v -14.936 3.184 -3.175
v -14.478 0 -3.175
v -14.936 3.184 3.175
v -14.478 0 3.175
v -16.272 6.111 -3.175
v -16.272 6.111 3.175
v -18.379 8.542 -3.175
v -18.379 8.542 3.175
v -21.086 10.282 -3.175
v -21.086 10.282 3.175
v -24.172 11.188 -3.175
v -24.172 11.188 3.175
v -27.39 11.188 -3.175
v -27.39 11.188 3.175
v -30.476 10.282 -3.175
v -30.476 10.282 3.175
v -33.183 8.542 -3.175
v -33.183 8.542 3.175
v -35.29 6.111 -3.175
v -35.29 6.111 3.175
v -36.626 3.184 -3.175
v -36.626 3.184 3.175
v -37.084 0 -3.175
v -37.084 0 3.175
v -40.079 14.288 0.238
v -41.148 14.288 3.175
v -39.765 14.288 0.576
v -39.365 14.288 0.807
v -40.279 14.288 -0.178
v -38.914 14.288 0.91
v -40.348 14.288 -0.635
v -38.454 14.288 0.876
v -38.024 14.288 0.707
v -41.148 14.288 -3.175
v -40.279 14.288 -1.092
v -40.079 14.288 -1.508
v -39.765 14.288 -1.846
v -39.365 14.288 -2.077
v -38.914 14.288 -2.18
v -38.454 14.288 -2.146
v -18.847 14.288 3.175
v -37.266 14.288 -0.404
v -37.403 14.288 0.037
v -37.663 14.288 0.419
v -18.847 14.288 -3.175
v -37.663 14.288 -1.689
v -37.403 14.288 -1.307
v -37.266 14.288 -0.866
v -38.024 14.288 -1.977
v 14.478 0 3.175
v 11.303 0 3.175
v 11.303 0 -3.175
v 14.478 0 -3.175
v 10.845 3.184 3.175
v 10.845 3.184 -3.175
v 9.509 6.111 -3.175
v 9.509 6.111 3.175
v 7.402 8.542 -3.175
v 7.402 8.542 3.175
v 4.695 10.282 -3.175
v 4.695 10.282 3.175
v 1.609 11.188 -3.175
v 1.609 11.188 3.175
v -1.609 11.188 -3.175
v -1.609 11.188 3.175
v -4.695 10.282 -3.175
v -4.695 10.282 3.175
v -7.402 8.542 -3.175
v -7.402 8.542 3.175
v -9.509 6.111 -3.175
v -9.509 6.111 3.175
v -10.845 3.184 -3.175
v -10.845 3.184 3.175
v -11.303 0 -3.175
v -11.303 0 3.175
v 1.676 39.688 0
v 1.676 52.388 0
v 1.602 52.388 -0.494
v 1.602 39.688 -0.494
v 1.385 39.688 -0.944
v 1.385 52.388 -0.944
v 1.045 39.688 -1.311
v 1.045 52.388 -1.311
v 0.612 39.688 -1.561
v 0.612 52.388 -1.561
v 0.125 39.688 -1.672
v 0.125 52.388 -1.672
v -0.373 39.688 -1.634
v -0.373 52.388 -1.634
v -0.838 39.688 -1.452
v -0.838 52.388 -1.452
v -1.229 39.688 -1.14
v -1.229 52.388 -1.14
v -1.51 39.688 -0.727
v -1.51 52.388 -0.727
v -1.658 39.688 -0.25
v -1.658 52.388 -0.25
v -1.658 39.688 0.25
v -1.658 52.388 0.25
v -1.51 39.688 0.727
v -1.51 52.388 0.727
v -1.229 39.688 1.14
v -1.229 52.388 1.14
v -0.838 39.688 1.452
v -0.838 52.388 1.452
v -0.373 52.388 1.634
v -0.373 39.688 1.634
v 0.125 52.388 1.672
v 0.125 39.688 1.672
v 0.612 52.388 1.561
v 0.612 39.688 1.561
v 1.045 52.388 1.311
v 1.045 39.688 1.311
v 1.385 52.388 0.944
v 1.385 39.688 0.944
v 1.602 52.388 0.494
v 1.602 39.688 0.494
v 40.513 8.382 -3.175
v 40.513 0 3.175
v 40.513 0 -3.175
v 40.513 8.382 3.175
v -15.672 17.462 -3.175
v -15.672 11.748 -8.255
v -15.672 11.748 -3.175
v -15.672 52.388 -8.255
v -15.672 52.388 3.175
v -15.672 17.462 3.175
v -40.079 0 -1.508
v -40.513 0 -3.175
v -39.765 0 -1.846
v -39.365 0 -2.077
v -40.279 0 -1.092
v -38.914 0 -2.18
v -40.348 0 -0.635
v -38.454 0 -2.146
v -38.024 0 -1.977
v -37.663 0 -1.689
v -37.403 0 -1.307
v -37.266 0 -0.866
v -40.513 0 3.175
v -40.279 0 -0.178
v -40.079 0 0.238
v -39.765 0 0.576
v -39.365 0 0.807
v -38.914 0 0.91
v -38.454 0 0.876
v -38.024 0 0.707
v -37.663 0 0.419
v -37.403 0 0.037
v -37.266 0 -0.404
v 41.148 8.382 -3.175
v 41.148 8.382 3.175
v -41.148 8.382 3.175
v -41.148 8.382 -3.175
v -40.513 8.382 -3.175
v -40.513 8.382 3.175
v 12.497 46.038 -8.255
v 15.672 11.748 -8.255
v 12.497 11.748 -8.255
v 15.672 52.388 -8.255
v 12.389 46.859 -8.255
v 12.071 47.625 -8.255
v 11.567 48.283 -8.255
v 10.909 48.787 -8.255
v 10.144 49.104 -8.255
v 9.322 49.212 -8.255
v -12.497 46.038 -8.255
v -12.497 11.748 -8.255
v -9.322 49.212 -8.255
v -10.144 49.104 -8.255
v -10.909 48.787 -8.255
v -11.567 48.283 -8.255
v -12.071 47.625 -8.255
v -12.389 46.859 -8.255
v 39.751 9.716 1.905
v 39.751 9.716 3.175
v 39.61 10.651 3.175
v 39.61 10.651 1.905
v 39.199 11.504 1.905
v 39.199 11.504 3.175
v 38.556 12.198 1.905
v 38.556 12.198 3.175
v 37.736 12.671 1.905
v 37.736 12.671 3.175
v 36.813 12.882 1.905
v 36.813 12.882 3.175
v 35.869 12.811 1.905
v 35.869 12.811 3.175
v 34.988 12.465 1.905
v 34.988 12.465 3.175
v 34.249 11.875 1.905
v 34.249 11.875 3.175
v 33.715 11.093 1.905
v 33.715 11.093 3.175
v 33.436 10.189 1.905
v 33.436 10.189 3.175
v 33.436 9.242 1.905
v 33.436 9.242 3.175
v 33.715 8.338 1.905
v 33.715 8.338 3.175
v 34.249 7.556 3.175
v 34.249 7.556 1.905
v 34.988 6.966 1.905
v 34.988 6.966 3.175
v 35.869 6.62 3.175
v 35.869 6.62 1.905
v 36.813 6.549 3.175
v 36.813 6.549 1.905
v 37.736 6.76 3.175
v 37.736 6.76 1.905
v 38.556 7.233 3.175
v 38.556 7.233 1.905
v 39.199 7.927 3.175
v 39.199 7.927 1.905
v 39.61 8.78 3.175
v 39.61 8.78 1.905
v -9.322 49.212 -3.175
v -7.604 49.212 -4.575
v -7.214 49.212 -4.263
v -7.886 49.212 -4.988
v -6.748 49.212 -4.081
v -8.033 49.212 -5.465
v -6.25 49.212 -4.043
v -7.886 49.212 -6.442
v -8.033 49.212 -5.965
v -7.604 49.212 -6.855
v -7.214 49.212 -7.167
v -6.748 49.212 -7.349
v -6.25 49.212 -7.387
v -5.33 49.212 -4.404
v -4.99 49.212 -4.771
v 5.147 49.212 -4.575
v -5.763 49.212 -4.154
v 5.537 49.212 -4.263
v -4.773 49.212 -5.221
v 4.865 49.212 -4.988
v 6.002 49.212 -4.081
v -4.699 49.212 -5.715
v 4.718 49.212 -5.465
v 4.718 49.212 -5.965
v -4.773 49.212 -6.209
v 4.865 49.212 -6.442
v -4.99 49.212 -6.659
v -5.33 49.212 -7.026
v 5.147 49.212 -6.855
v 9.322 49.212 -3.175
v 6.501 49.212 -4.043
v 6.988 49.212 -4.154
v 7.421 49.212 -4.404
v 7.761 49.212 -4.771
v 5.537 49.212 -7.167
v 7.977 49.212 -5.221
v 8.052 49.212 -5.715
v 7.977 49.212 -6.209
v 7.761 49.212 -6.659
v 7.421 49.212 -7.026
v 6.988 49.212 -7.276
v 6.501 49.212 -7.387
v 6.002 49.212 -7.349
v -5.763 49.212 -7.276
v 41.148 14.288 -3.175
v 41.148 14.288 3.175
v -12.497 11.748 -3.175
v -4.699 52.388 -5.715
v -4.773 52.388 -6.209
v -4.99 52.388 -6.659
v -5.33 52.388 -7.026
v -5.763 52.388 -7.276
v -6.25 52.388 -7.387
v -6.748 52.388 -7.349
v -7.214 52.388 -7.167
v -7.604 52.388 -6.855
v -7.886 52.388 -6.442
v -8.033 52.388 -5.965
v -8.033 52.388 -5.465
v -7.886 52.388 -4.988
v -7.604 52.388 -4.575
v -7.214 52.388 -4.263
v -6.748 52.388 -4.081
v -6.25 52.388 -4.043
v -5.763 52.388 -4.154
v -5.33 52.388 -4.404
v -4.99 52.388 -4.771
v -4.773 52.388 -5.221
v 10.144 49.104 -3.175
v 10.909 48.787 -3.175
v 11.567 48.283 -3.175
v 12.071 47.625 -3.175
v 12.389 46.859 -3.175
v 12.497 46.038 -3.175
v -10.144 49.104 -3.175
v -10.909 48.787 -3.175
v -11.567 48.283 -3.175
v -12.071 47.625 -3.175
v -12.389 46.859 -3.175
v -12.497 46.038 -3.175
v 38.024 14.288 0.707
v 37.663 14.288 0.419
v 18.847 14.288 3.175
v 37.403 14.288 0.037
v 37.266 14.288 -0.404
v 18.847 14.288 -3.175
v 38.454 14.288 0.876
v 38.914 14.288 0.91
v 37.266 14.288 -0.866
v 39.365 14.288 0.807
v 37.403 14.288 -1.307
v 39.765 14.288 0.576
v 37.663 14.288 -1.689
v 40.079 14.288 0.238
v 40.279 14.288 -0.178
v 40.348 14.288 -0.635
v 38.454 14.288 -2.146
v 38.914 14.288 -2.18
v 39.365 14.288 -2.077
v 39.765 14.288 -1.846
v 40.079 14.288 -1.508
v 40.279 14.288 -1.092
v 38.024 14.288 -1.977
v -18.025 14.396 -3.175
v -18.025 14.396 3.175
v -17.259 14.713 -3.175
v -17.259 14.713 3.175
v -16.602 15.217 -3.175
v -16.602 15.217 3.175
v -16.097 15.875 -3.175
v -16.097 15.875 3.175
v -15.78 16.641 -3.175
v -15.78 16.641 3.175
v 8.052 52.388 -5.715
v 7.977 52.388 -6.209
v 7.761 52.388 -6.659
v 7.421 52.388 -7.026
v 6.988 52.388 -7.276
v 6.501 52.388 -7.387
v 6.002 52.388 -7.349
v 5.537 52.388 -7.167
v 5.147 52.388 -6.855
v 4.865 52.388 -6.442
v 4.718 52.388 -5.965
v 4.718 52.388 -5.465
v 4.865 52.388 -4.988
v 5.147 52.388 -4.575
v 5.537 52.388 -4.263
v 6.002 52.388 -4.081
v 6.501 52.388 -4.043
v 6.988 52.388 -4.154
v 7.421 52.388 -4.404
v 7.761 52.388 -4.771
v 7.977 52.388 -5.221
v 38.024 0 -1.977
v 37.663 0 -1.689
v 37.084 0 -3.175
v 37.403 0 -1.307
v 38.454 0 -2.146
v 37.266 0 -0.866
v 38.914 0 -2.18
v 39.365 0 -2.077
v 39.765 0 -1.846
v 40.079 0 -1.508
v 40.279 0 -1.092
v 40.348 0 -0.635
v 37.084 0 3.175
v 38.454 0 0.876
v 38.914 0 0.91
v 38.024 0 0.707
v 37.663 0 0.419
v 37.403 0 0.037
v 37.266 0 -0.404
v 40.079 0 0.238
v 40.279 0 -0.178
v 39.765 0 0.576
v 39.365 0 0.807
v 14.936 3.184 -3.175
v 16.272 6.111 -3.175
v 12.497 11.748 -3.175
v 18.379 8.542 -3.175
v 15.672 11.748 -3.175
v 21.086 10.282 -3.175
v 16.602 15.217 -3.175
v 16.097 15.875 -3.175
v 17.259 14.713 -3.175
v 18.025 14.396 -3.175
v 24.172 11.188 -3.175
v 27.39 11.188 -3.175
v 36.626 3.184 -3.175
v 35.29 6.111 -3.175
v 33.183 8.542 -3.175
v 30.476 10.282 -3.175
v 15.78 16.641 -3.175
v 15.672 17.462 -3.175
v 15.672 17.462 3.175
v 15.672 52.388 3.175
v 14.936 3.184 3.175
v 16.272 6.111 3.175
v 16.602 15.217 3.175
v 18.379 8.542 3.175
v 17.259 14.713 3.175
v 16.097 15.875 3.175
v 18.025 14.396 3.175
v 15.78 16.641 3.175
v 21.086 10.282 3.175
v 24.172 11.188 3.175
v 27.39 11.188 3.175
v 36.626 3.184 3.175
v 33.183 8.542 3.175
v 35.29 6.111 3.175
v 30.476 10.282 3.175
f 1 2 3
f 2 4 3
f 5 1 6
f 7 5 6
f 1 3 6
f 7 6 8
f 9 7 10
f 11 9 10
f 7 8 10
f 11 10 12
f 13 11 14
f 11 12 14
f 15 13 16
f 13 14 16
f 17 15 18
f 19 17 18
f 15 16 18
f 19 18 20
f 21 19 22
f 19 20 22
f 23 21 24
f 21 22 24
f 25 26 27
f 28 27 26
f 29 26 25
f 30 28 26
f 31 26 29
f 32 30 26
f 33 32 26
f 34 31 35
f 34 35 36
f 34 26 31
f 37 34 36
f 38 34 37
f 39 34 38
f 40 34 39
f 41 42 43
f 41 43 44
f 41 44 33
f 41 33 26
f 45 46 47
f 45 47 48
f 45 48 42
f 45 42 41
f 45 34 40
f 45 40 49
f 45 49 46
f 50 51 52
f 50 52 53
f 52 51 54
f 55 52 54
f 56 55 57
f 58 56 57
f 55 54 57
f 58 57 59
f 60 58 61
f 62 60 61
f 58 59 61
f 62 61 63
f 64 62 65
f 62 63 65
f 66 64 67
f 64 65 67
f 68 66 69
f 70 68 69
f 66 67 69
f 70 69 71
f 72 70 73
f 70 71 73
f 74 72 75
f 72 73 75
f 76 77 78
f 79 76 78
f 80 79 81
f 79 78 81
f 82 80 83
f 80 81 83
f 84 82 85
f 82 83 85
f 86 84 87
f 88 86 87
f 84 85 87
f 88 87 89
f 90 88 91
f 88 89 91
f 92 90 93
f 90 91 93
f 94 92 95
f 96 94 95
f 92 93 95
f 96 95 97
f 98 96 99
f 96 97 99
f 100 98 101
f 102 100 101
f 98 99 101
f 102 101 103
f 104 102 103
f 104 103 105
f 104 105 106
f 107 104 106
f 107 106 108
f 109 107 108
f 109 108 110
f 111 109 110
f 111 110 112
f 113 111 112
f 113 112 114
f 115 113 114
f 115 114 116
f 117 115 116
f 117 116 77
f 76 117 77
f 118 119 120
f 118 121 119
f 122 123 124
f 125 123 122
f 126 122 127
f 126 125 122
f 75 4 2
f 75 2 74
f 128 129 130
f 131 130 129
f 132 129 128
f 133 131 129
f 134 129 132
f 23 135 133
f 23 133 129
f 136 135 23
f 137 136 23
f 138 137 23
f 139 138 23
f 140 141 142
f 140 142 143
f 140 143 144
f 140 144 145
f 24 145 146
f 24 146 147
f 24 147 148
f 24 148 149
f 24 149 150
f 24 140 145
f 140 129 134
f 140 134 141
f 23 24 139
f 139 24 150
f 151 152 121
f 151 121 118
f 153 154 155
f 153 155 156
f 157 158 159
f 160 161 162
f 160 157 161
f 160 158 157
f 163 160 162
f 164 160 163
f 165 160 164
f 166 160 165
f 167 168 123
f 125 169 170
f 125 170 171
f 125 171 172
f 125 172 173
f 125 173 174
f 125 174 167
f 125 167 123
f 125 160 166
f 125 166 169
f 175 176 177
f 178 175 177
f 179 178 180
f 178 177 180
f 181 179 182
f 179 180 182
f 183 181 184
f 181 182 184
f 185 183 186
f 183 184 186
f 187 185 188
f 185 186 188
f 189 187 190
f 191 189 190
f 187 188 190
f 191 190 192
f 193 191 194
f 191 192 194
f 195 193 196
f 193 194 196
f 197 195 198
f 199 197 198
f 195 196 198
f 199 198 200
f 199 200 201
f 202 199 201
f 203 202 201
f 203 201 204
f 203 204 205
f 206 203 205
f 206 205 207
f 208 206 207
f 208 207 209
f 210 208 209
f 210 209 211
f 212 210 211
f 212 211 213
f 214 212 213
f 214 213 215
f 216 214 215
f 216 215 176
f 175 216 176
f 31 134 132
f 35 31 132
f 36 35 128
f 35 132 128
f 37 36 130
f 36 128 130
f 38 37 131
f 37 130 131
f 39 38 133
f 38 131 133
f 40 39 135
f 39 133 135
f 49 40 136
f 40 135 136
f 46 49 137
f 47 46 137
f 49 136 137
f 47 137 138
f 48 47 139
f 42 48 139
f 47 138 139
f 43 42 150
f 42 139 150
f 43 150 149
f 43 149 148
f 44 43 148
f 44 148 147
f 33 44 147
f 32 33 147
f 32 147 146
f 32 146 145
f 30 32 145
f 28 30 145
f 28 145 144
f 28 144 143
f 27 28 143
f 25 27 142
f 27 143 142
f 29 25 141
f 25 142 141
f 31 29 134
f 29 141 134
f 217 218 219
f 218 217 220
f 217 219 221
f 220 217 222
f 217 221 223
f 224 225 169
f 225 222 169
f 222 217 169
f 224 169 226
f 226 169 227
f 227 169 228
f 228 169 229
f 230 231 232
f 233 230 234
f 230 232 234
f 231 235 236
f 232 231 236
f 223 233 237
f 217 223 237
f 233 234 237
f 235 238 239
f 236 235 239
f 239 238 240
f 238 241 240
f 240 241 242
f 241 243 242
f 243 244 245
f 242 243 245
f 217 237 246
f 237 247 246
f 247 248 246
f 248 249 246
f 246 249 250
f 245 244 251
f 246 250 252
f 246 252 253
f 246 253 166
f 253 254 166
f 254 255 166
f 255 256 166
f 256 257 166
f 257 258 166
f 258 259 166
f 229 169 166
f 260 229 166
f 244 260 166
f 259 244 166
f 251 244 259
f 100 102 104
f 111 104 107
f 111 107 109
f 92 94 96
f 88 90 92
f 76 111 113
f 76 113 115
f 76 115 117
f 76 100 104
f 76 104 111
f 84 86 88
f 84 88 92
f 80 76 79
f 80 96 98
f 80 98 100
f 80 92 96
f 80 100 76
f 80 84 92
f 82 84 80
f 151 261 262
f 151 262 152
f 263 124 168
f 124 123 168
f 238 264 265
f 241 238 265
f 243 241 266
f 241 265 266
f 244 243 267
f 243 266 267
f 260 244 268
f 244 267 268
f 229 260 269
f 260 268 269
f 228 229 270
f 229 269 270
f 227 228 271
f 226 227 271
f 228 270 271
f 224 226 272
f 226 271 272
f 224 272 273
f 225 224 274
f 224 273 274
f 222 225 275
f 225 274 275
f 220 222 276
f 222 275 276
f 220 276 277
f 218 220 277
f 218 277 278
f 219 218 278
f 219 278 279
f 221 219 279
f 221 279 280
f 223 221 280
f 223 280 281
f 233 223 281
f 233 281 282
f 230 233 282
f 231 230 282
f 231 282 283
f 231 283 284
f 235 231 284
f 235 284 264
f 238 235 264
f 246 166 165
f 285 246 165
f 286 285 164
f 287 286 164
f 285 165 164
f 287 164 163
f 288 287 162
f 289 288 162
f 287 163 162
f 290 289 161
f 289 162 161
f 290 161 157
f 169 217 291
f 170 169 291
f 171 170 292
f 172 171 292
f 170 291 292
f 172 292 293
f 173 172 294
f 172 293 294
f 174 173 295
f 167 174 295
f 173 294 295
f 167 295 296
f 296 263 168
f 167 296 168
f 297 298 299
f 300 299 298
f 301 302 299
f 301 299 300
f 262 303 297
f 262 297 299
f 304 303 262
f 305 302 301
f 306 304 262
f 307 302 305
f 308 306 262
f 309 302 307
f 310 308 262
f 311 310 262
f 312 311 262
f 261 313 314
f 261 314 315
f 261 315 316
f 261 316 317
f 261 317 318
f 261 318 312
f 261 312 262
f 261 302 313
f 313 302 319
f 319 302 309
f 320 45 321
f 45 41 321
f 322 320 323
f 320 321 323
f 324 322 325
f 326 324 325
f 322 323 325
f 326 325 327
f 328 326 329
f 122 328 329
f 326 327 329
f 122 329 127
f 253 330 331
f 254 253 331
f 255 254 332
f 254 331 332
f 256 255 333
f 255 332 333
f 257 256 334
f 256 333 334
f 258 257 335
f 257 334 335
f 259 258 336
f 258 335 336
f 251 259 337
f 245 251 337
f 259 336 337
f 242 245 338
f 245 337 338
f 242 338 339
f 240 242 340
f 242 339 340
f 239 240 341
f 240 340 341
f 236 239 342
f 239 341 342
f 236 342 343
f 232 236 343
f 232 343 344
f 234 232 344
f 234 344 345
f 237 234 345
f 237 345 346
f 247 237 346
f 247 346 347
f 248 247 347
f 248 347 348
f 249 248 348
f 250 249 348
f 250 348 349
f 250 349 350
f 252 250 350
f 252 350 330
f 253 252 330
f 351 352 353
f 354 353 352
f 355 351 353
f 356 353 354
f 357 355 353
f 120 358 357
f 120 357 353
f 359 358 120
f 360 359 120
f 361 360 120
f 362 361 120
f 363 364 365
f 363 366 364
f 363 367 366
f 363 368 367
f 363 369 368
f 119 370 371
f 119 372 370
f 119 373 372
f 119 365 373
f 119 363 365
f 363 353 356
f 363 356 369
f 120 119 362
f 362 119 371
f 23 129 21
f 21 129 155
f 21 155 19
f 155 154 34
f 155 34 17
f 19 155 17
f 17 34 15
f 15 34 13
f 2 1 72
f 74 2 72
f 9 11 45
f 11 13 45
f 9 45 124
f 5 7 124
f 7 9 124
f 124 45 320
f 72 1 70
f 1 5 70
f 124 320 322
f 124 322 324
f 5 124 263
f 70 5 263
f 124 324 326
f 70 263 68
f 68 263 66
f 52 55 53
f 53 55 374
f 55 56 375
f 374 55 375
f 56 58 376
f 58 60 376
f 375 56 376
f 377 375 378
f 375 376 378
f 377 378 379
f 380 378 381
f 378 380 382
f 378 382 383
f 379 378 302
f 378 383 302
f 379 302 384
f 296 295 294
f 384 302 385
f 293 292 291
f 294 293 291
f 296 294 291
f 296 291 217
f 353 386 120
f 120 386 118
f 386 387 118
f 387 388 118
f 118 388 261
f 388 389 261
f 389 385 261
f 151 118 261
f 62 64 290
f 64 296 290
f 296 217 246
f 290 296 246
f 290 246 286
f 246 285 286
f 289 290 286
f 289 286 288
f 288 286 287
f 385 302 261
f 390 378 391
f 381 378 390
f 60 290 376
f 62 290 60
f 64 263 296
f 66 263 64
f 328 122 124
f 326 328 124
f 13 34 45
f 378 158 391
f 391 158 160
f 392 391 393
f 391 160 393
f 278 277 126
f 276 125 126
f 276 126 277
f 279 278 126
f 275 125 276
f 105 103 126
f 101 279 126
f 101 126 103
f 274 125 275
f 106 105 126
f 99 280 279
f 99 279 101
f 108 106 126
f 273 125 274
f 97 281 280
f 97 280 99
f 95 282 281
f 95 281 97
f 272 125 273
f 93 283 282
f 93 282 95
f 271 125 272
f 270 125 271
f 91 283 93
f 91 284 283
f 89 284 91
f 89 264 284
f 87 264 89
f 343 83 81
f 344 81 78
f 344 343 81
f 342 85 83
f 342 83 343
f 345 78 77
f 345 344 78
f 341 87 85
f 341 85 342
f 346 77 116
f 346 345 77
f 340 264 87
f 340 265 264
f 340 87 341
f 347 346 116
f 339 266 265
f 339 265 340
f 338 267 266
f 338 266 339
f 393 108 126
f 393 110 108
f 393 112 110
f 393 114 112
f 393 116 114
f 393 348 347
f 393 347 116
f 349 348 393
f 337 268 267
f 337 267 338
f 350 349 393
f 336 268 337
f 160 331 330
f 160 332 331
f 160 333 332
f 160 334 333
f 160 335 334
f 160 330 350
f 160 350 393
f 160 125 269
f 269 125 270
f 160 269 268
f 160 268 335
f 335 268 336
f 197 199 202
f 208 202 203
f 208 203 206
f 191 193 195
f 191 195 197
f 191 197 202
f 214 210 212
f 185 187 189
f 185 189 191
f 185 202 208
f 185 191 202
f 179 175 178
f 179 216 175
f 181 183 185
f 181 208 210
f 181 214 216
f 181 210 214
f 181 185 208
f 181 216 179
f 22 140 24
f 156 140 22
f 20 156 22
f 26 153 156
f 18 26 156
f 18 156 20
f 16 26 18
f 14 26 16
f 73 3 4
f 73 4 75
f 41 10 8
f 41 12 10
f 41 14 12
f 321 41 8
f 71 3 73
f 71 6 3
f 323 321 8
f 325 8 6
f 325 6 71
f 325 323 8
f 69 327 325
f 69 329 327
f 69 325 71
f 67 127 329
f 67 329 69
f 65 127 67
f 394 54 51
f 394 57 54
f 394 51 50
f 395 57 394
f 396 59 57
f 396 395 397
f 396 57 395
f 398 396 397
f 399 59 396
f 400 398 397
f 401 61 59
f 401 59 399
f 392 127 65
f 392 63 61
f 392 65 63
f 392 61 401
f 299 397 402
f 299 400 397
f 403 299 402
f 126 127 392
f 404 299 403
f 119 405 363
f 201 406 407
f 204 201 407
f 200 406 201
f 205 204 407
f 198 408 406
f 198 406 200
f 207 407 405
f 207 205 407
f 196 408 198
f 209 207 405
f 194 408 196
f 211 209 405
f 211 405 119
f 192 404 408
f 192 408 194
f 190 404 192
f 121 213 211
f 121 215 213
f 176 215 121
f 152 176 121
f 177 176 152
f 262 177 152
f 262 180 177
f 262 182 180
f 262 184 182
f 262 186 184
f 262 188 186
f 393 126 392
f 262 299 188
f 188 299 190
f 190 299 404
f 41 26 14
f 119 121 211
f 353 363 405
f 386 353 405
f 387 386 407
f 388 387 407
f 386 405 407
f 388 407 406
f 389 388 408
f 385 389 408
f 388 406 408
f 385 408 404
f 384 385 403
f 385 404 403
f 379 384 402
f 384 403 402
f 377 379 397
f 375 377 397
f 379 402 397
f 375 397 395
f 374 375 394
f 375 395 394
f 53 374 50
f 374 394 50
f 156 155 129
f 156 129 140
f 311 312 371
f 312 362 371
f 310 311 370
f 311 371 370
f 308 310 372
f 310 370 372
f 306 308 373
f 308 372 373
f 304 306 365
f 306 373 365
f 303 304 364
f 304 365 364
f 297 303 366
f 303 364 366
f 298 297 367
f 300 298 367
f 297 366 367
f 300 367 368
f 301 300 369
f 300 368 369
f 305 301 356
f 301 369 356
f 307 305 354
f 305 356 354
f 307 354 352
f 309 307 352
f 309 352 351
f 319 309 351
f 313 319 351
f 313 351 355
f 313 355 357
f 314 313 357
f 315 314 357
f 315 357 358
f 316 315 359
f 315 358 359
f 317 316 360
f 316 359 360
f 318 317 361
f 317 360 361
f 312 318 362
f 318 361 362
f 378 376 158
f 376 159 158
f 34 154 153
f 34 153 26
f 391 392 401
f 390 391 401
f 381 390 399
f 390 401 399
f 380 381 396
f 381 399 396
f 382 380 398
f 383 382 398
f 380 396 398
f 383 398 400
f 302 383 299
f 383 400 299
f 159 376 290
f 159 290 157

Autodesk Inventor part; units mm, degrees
ref_plane "YZ Plane" through (0, 0, 0) normal (1, 0, 0) x (0, 1, 0)
ref_plane "XZ Plane" through (0, 0, 0) normal (0, 1, 0) x (-1, 0, 0)
ref_plane "XY Plane" through (0, 0, 0) normal (0, 0, 1) x (1, 0, 0)
sketch "Sketch1" plane through (0, 0, 0) normal (0, 0, 1) x (1, 0, 0)
  line L0 (-41.148, 14.2875) -> (41.148, 14.2875)
  line L1 (41.148, 14.2875) -> (41.148, -14.2875)
  line L2 (41.148, -14.2875) -> (-41.148, -14.2875)
  line L3 (-41.148, -14.2875) -> (-41.148, 14.2875)
  point P0 (0, 0)
  dimension "d0" = 82.296
  dimension "d1" = 41.148
  dimension "d2" = 14.2875
  dimension "d3" = 28.575
extrude "Extrusion1" add sketch "Sketch1" along normal mid plane 6.35
sketch "Sketch2" plane through (0, 0, 3.175) normal (0, 0, 1) x (1, 0, 0)
  circle A0 centre (-25.781, 0) radius 11.303
  circle A1 centre (0, 0) radius 11.303
  line L0 (41.148, -14.2875) -> (41.148, 14.2875) projected
  circle A2 centre (25.781, 0) radius 11.303
  line L1 (-41.148, 14.2875) -> (-41.148, -14.2875) projected
  line L2 (-41.148, 0) -> (41.148, 0) construction
  line L3 (41.148, 14.2875) -> (-41.148, 14.2875) projected
  point P0 (0, 0)
  dimension "d6" = 22.606
  dimension "d9" = 22.606
  dimension "d11" = 22.606
  dimension "d14" = 25.781
  dimension "d21" = 82.296
  dimension "d22" = 25.781
  dimension "d50" = 0
  dimension "d150" = 3.175
sketch "Sketch4" plane through (-41.148, -14.2875, -3.175) normal (-1, 0, 0) x (0, 0, 1)
  line L0 (0, 0) -> (0, 28.575) projected
  line L1 (6.35, 28.575) -> (6.35, 0) projected
  line L2 (0, 22.6695) -> (6.35, 22.6695)
  line L3 (6.35, 22.6695) -> (6.35, 5.9055)
  line L4 (6.35, 5.9055) -> (0, 5.9055)
  line L5 (0, 5.9055) -> (0, 22.6695)
  point P0 (3.175, 14.2875)
  dimension "d30" = 8.382
  dimension "d31" = 16.764
extrude "Extrusion3" cut sketch "Sketch4" against normal blind 0.635
mirror "Mirror1" about plane through (0, 0, 0) normal (1, 0, 0) of "Extrusion3"
sketch "Sketch5" plane through (0, 0, 3.175) normal (0, 0, 1) x (1, 0, 0)
  circle A0 centre (0, 9.7155) radius 3.175 construction
  line L0 (41.148, 14.2875) -> (-41.148, 14.2875) projected
  line L1 (-18.3944, 20.454) -> (40.513, 0) construction
  line L2 (40.513, 8.382) -> (40.513, -8.382) projected
  circle A1 centre (2.6968, 17.4822) radius 3.175 construction
  circle A2 centre (35.941, 1.5875) radius 3.175 construction
  circle A3 centre (-35.941, 26.5465) radius 3.175 construction
  line L3 (-40.513, 8.382) -> (-40.513, -8.382) projected
  circle A4 centre (36.576, 9.7155) radius 3.175
  circle A5 centre (-36.576, -9.7155) radius 3.175
  line L4 (41.148, 8.382) -> (41.148, 14.2875) projected
  line L5 (-41.148, -14.2875) -> (41.148, -14.2875) projected
  line L6 (-41.148, -14.2875) -> (-41.148, -8.382) projected
  point P0 (0, 0)
  dimension "d34" = 6.35
  dimension "d35" = 4.572
  dimension "d53" = 6.35
  dimension "d54" = 6.35
  dimension "d55" = 4.572
  dimension "d56" = 4.572
  dimension "d57" = 12.7
  dimension "d58" = 6.35
  dimension "d59" = 6.35
  dimension "d60" = 4.572
  dimension "d61" = 4.572
  dimension "d62" = 4.572
  dimension "d63" = 4.572
extrude "Extrusion4" cut sketch "Sketch5" against normal blind 1.27
sketch "Sketch7" plane through (-41.148, -14.2875, 3.175) normal (0, -1, 0) x (1, 0, 0)
  line L0 (27.178, -14.605) -> (55.118, -14.605)
  line L1 (55.118, -14.605) -> (55.118, 8.255)
  line L2 (55.118, 8.255) -> (27.178, 8.255)
  line L3 (27.178, 8.255) -> (27.178, -14.605)
  point P0 (41.148, -3.175)
  dimension "d39" = 27.94
  dimension "d40" = 22.86
  dimension "d41" = 11.43
  dimension "d42" = 13.97
extrude "Extrusion5" [suppressed]
sketch "Sketch8" plane through (0, 0, -3.175) normal (0, 0, -1) x (-1, 0, 0)
  line L0 (-41.148, 14.2875) -> (41.148, 14.2875) projected
  line L1 (15.6718, 14.2875) -> (-15.6718, 14.2875)
  line L2 (-15.6718, 14.2875) -> (-15.6718, 52.3875)
  line L3 (-15.6718, 52.3875) -> (15.6718, 52.3875)
  line L4 (15.6718, 52.3875) -> (15.6718, 14.2875)
  point P0 (0, 0)
  dimension "d45" = 31.3436
  dimension "d46" = 38.1
  dimension "d47" = 15.6718
extrude "Extrusion6" add sketch "Sketch8" against normal up to surface (6.35 mm away)
extrude "Extrusion7" cut sketch "Sketch2" against normal blind 25.4
sketch "Sketch9" plane through (-15.6718, 52.3875, -3.175) normal (0, 1, 0) x (1, 0, 0)
  line L0 (-25.4762, -6.35) -> (56.8198, -6.35) projected
  line L1 (3.1718, -6.35) -> (28.1718, -6.35)
  line L2 (28.1718, -6.35) -> (28.1718, -3.175)
  line L3 (28.1718, -3.175) -> (3.1718, -3.175)
  line L4 (3.1718, -3.175) -> (3.1718, -6.35)
  point P0 (15.6718, -3.175)
  dimension "d64" = 3.175
  dimension "d65" = 25
  dimension "d66" = 12.5
extrude "Extrusion8" [suppressed]
sketch "Sketch13" plane through (0, 0, 3.175) normal (0, 0, 1) x (1, 0, 0)
  line L0 (-41.148, -8.382) -> (-41.148, -14.2875) projected
  line L1 (-41.148, -14.2875) -> (41.148, -14.2875) projected
  line L2 (41.148, -14.2875) -> (41.148, -8.382) projected
  line L3 (41.148, -8.382) -> (40.513, -8.382) projected
  line L4 (-40.513, -8.382) -> (-41.148, -8.382) projected
  line L5 (-40.513, -8.382) -> (-40.513, 0)
  line L6 (-40.513, 8.382) -> (-40.513, -8.382) projected
  line L7 (-40.513, 0) -> (40.513, 0)
  line L8 (40.513, 8.382) -> (40.513, -8.382) projected
  line L9 (40.513, 0) -> (40.513, -8.382)
  point P0 (0, 0)
extrude "Extrusion11" cut sketch "Sketch13" against normal through all
sketch "Sketch14" plane through (37.084, 0, 3.175) normal (0, -1, 0) x (1, 0, 0)
  line L0 (3.429, -6.35) -> (0, -6.35) projected
  line L1 (3.429, 0) -> (3.429, -6.35) projected
  line L2 (0, 0) -> (3.429, 0) projected
  line L3 (0, -6.35) -> (0, 0) projected
  line L4 (-3.683, -1.27) -> (2.667, -1.27) projected
  circle A0 centre (1.7145, -3.81) radius 1.5494
  point P0 (-37.084, -3.175)
  dimension "d84" = 3.0988
  dimension "d85" = 6.35
  dimension "d86" = 5.08
  dimension "d87" = 3.429
  dimension "d88" = 1.7145
  dimension "d89" = 2.54
extrude "Extrusion12" cut sketch "Sketch14" against normal through all contours A0
mirror "Mirror3" about plane through (0, 0, 0) normal (1, 0, 0) of "Extrusion12"
thread "Thread3" size "5-40 UNC" class "2B" standard "ANSI Unified Screw Threads" length 12.7 offset 6.35
thread "Thread4" size "5-40 UNC" class "2B" standard "ANSI Unified Screw Threads" length 12.7 offset 6.35
sketch "Sketch15" plane through (-15.6718, 52.3875, -3.175) normal (0, 1, 0) x (1, 0, 0)
  line L0 (0, -6.35) -> (0, 0) projected
  line L1 (0, 0) -> (3.175, 0)
  line L2 (3.175, 0) -> (3.175, 5.08)
  line L3 (3.175, 5.08) -> (0, 5.08)
  line L4 (0, 5.08) -> (0, 0)
  line L5 (31.3436, 0) -> (0, 0) construction
  line L6 (11.5062, 0) -> (19.8374, 0)
  line L7 (31.3436, 0) -> (28.1686, 0)
  line L8 (28.1686, 0) -> (28.1686, 5.08)
  line L9 (28.1686, 5.08) -> (31.3436, 5.08)
  line L10 (31.3436, 5.08) -> (31.3436, 0)
  line L11 (31.3436, 0) -> (31.3436, -6.35) projected
  line L12 (4.3688, 0) -> (26.9748, 0) projected
  line L13 (19.8374, 0) -> (28.1686, 0)
  point P0 (15.6718, -3.175)
  point P1 (19.8374, 5.08)
  point P2 (3.175, 0.8467)
  dimension "d96" = 5.08
  dimension "d102" = 31.3436
  dimension "d105" = 3.175
  dimension "d106" = 3.175
  dimension "d120" = 5.08
sketch "Sketch16" plane through (-15.6718, 52.3875, 3.175) normal (0, 1, 0) x (1, 0, 0)
  line L0 (31.3436, 6.35) -> (0, 6.35) projected
  arc A0 (8.3312, 6.35) -> (11.5062, 6.35) centre (9.9187, 6.35) ccw
  line L1 (11.5062, 10.5833) -> (11.5062, 6.35) projected
  line L2 (8.3312, 6.35) -> (8.3312, 10.5833) projected
  line L3 (4.3688, 6.35) -> (26.9748, 6.35) projected
  arc A1 (19.8374, 6.35) -> (23.0124, 6.35) centre (21.4249, 6.35) ccw
  line L4 (23.0124, 10.5833) -> (23.0124, 6.35) projected
  line L5 (19.8374, 6.35) -> (19.8374, 10.5833) projected
  point P0 (15.6718, 3.175)
extrude "Extrusion15" [suppressed]
fillet "Fillet3" [suppressed]
fillet "Fillet4" [suppressed]
fillet "Fillet5" radius 3.175 2 edges at (15.6718, 14.2875, 0) (-15.6718, 14.2875, 0)
extrude "Extrusion16" add sketch "Sketch15" against normal blind 40.64
sketch "Sketch17" plane through (-15.6718, 52.3875, 3.175) normal (0, 1, 0) x (1, 0, 0)
  line L0 (28.1686, 6.35) -> (28.1686, 11.43) projected
  line L1 (3.175, 11.43) -> (3.175, 6.35) projected
  line L2 (28.1686, 11.43) -> (3.175, 11.43)
  line L3 (3.175, 11.43) -> (3.175, 6.35)
  line L4 (3.175, 6.35) -> (28.1686, 6.35)
  line L5 (28.1686, 6.35) -> (28.1686, 11.43)
  point P0 (15.6718, 3.175)
extrude "Extrusion17" add sketch "Sketch17" against normal blind 3.175
fillet "Fillet6" radius 3.175 2 edges at (-12.4968, 49.2125, -5.715) (12.4968, 49.2125, -5.715)
sketch "Sketch18" plane through (-15.6718, 52.3875, 3.175) normal (0, 1, 0) x (1, 0, 0)
  circle A0 centre (9.2964, 8.89) radius 1.6764
  circle A1 centre (22.0472, 8.89) radius 1.6764
  line L0 (31.3436, 11.43) -> (0, 11.43) projected
  line L1 (6.35, 6.35) -> (24.9936, 6.35) projected
  line L2 (6.35, 11.43) -> (6.35, 6.35) projected
  line L3 (24.9936, 6.35) -> (24.9936, 11.43) projected
  line L4 (7.62, 8.89) -> (23.7236, 8.89) construction
  point P0 (15.6718, 3.175)
  point P1 (23.7236, 8.89)
  dimension "d126" = 3.3528
  dimension "d127" = 3.3528
  dimension "d128" = 5.08
  dimension "d129" = 2.54
  dimension "d130" = 2.54
  dimension "d132" = 1.27
  dimension "d134" = 1.27
extrude "Extrusion18" cut sketch "Sketch18" against normal through all contours A0 | A1
sketch "Sketch19" plane through (-15.6718, 52.3875, 3.175) normal (0, 1, 0) x (1, 0, 0)
  line L0 (6.35, 6.35) -> (24.9936, 6.35) projected
  line L1 (0, 0) -> (31.3436, 0) projected
  circle A0 centre (15.6718, 3.175) radius 1.6764
  dimension "d137" = 3.3528
extrude "Extrusion19" cut sketch "Sketch19" against normal blind 12.7
thread "Thread5" size "6-32 UNC" class "2B" standard "ANSI Unified Screw Threads" full length
sketch "Sketch20" plane through (-15.6718, 52.3875, 3.175) normal (0, 1, 0) x (1, 0, 0)
  circle A0 centre (9.2964, 8.89) radius 1.6764 projected
  circle A1 centre (15.6718, 3.175) radius 1.6764 projected
  circle A2 centre (9.2964, 8.89) radius 1.6764 projected
  circle A3 centre (22.0472, 8.89) radius 1.6764 projected
  line L0 (0, 0) -> (31.3436, 0) projected
  line L1 (31.3436, 11.43) -> (31.3436, 0) projected
  line L2 (31.3436, 11.43) -> (0, 11.43) projected
  line L3 (0, 11.43) -> (0, 0) projected
  dimension "d142" = 2.54
  dimension "d143" = 9.2964
  dimension "d144" = 8.255
equation "\"d1\" = 0.5 * d0"
equation "\"d2\" = 0.5 * d3"
equation "\"d9\" = d7"
equation "\"d11\" = d9"
equation "\"d22\" = d14"
equation "\"d30\" = 0.5 * d31"
equation "\"d41\" = 0.5 * d40"
equation "\"d42\" = 0.5 * d39"
equation "\"d47\" = 0.5 * d45"
equation "\"d66\" = 0.5 * d65"
equation "\"d88\" = 0.5 * d87"
equation "\"d89\" = 0.5 * d86"
equation "\"d106\" = d105"
equation "\"d120\" = d96"
equation "\"d127\" = d126"
equation "\"d129\" = 0.5 * d128"
equation "\"d130\" = 0.5 * d128"
equation "\"d134\" = d132"
equation "\"d7\" = d6"
properties part number "Tube Holder with camera attachment" material "Aluminum 6061-AHC"
